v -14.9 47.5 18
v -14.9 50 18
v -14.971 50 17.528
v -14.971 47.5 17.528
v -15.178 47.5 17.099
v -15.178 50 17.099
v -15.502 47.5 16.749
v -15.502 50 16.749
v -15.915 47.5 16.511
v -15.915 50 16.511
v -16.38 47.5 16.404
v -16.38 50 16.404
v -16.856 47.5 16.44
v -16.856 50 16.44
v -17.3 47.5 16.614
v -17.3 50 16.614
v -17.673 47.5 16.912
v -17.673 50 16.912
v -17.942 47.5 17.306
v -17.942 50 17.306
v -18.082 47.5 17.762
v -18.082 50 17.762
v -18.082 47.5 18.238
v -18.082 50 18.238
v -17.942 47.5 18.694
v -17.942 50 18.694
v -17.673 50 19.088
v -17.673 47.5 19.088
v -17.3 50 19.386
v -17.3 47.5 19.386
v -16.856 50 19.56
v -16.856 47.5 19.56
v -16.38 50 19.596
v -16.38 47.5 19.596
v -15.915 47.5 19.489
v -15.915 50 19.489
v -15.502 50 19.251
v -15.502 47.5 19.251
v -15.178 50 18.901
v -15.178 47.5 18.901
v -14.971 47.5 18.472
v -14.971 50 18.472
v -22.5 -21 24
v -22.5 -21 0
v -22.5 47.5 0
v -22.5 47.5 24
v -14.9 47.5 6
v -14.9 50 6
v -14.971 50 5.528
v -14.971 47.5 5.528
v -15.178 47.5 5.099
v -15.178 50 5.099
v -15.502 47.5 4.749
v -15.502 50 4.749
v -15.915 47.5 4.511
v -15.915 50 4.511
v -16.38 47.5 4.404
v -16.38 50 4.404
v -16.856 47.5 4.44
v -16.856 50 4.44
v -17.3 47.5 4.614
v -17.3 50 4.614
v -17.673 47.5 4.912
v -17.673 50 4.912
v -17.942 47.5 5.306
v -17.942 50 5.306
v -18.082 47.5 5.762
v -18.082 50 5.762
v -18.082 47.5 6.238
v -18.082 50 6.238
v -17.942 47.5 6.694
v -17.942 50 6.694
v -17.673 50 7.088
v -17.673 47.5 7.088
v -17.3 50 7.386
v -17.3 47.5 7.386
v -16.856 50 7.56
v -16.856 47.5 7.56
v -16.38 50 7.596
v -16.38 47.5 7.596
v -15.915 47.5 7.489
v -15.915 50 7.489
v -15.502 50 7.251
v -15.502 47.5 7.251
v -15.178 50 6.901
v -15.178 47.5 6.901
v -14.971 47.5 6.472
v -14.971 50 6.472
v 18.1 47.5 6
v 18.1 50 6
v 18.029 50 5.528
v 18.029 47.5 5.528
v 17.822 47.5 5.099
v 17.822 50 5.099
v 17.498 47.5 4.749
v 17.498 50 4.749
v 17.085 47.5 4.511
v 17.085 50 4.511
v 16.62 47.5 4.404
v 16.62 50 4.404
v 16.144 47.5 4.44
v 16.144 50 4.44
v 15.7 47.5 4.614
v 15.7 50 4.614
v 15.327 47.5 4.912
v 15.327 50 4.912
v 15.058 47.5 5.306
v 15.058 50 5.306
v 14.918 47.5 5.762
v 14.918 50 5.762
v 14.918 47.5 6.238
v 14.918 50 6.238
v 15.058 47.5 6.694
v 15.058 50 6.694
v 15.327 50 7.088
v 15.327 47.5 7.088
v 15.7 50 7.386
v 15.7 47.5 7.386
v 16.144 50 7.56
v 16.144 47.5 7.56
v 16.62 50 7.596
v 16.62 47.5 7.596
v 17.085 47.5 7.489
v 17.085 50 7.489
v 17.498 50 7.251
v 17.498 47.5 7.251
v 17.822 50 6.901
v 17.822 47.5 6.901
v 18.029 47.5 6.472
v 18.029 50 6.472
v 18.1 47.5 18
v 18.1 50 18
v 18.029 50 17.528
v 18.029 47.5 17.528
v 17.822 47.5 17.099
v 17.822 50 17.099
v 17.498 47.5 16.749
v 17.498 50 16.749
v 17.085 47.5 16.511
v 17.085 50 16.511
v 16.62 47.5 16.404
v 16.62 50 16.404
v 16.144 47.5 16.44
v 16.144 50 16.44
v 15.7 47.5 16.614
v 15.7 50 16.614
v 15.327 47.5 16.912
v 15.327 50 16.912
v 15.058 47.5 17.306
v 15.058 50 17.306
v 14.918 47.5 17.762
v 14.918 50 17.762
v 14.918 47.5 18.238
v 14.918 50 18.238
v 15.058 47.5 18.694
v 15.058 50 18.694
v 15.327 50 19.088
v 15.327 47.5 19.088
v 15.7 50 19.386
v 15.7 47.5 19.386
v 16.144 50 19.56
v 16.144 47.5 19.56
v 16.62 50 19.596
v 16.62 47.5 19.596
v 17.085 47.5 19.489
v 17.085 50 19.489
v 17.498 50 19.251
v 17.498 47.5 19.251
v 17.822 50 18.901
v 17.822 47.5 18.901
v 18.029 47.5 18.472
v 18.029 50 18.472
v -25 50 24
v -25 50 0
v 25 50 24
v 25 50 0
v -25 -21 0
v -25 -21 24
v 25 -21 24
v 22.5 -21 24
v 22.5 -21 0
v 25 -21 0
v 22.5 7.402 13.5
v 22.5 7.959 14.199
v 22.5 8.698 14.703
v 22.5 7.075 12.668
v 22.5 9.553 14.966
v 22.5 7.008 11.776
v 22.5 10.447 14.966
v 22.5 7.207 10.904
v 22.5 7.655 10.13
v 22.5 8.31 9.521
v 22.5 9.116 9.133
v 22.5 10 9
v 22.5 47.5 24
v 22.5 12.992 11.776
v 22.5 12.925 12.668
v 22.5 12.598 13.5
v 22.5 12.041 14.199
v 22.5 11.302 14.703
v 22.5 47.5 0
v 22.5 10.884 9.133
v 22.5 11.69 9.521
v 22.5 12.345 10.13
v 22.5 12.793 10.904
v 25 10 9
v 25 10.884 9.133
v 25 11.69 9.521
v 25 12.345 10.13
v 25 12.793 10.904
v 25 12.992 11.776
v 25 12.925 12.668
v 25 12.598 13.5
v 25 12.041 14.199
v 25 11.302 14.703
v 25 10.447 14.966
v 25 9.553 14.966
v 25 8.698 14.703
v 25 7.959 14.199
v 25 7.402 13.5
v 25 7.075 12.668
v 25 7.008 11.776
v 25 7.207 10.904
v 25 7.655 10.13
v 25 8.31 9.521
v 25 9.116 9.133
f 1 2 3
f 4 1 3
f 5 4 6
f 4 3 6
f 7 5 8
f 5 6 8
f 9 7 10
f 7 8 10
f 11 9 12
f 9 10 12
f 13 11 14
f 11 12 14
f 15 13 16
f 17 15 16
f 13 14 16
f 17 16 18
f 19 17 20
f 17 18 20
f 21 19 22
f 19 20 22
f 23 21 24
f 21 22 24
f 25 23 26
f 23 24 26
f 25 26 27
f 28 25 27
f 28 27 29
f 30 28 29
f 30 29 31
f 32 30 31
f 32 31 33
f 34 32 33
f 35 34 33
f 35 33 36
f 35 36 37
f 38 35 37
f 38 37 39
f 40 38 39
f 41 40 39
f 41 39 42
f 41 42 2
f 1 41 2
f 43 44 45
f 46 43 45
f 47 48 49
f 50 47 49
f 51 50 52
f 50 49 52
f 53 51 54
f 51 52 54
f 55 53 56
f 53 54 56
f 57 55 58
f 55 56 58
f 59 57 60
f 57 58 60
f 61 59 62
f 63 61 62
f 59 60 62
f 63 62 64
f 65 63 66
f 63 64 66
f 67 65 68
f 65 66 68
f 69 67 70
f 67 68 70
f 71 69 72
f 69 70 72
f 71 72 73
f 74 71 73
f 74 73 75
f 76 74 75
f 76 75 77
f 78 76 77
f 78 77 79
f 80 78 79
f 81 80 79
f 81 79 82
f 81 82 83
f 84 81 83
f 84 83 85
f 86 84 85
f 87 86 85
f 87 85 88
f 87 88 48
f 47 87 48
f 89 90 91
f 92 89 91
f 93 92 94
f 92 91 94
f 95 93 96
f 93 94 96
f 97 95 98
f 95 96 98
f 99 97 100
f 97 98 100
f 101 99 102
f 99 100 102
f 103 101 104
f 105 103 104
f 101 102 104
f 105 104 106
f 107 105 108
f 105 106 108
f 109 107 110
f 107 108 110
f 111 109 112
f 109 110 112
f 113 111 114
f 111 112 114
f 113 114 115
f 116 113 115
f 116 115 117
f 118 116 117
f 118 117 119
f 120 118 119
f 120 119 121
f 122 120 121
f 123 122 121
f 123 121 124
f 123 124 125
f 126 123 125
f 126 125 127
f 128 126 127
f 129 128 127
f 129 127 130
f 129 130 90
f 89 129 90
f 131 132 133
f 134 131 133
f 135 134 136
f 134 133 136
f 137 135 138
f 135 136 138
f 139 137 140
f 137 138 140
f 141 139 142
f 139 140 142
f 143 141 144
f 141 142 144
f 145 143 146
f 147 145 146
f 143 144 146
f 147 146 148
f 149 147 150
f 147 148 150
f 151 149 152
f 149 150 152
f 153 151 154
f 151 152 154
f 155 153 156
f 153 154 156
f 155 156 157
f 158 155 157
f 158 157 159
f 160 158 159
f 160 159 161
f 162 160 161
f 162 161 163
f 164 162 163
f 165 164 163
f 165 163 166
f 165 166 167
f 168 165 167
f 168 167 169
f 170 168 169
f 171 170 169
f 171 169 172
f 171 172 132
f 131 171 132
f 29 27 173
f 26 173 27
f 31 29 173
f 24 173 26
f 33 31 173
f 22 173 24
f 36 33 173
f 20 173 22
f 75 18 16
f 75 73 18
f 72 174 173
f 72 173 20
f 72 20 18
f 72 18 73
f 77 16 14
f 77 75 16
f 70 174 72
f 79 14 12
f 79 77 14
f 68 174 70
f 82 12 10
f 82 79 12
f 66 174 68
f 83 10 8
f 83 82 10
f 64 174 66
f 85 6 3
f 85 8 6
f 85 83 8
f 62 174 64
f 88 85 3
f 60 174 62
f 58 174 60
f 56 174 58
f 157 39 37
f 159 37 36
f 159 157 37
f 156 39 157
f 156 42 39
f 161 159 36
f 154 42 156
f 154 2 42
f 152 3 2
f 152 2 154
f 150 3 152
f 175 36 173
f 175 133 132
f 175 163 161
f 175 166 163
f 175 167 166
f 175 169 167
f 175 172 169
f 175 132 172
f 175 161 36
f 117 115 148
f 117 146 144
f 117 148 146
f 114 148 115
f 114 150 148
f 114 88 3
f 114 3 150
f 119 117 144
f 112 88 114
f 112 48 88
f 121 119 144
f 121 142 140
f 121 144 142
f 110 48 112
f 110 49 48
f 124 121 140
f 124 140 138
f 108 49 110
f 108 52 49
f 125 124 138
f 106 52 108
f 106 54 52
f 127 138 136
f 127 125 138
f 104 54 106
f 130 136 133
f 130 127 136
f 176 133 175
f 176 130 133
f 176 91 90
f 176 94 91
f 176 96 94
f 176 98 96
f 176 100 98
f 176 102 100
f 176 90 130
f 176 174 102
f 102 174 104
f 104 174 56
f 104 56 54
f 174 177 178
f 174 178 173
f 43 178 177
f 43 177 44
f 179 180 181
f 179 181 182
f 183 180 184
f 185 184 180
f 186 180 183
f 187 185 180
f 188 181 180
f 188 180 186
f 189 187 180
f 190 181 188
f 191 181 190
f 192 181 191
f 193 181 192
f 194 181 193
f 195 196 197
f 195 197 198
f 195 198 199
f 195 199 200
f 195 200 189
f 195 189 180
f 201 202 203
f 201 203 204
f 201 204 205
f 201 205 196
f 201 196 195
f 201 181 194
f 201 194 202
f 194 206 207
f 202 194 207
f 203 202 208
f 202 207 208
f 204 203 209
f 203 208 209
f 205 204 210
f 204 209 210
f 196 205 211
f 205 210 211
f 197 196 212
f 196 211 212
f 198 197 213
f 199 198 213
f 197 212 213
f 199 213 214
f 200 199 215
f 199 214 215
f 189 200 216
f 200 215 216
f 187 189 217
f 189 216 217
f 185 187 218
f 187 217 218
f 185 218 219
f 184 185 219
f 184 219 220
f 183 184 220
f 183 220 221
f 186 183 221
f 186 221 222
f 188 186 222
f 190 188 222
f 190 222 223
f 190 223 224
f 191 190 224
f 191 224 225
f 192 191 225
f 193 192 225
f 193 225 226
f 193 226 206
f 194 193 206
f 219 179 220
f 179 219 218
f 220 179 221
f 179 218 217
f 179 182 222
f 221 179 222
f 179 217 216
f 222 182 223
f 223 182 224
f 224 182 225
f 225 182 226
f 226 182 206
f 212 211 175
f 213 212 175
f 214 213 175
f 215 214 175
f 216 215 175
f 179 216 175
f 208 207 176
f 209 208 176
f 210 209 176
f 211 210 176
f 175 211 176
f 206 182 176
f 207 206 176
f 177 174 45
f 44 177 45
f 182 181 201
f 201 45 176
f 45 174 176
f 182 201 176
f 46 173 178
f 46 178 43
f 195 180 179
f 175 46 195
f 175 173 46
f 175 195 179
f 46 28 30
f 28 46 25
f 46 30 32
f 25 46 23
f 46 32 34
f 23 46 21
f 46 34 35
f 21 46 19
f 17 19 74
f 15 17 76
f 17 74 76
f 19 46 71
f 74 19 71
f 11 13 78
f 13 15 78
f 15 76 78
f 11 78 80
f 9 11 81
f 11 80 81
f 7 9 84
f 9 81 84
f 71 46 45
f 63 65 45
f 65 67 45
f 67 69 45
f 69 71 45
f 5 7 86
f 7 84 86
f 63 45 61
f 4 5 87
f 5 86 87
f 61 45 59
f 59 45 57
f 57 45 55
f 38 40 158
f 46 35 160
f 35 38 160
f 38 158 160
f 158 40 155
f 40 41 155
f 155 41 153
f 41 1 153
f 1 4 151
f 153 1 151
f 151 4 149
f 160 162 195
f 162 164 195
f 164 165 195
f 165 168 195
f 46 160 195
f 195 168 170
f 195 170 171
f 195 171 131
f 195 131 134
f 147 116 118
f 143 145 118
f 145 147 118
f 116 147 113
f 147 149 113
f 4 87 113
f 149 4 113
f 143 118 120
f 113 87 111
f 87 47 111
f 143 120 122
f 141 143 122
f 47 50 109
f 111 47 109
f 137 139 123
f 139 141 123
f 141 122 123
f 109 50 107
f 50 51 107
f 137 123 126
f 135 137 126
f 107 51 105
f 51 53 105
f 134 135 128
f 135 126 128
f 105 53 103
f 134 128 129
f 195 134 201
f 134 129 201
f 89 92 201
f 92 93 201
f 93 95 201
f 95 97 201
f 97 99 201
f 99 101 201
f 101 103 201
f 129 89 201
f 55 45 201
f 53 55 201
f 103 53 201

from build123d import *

# Parameters (mm, degrees)
SKETCH_1_W                      = 50
SKETCH_1_H                      = 100
SKETCH_1_W_2                    = 45
SKETCH_1_H_2                    = 95
EXTRUDE_1_DEPTH                 = 24
SKETCH_3_R                      = 1.6
CUT_EXTRUDE_2_DEPTH             = 1
CUT_EXTRUDE_2_DEPTH_BACK        = 101
CUT_EXTRUDE_3_REACH             = 52
SKETCH_4_R                      = 3
SKETCH_4_R_2                    = 4
CUT_EXTRUDE_3_DIRECTION_2_DEPTH = 1
SKETCH_5_W                      = 50
SKETCH_5_H                      = 24
CUT_EXTRUDE_4_DEPTH             = 29


with BuildPart() as part:
    # ｽｹｯﾁ1 → ﾎﾞｽ - 押し出し1 (new body)
    with BuildSketch(Plane.XY):
        Rectangle(SKETCH_1_W, SKETCH_1_H)
        Rectangle(SKETCH_1_W_2, SKETCH_1_H_2, mode=Mode.SUBTRACT)
    extrude(amount=EXTRUDE_1_DEPTH)

    # ｽｹｯﾁ3 → ｶｯﾄ - 押し出し2 (cut, two sides)
    with BuildSketch(Plane(origin=(0, 50, 0), x_dir=(1, 0, 0), z_dir=(0, 1, 0))) as cut_extrude_2_sk:
        with Locations((-16.5, -6)):
            Circle(SKETCH_3_R)
        with Locations((16.5, -6)):
            Circle(SKETCH_3_R)
        with Locations((16.5, -18)):
            Circle(SKETCH_3_R)
        with Locations((-16.5, -18)):
            Circle(SKETCH_3_R)
    extrude(amount=CUT_EXTRUDE_2_DEPTH, mode=Mode.SUBTRACT)
    extrude(cut_extrude_2_sk.sketch, amount=-CUT_EXTRUDE_2_DEPTH_BACK, mode=Mode.SUBTRACT)

    # ｽｹｯﾁ4 → ｶｯﾄ - 押し出し3 (cut, up to next)
    with BuildSketch(Plane(origin=(25, 0, 0), x_dir=(0, 0, -1), z_dir=(1, 0, 0)), mode=Mode.PRIVATE) as cut_extrude_3_sk1:
        with Locations((-12, 10)):
            Circle(SKETCH_4_R)
    cut_extrude_3_tool1 = extrude(cut_extrude_3_sk1.sketch, amount=-CUT_EXTRUDE_3_REACH, mode=Mode.PRIVATE) & part.part
    add(cut_extrude_3_tool1.solids().sort_by_distance((25, 10, 12))[0], mode=Mode.SUBTRACT)
    # ｽｹｯﾁ4 → ｶｯﾄ - 押し出し3 (cut, up to next)
    with BuildSketch(Plane(origin=(25, 0, 0), x_dir=(0, 0, -1), z_dir=(1, 0, 0)), mode=Mode.PRIVATE) as cut_extrude_3_sk2:
        with Locations((-12, -30)):
            Circle(SKETCH_4_R_2)
    cut_extrude_3_tool2 = extrude(cut_extrude_3_sk2.sketch, amount=-CUT_EXTRUDE_3_REACH, mode=Mode.PRIVATE) & part.part
    add(cut_extrude_3_tool2.solids().sort_by_distance((25, -30, 12))[0], mode=Mode.SUBTRACT)

    # ｽｹｯﾁ4 → ｶｯﾄ - 押し出し3 direction 2 (cut)
    with BuildSketch(Plane(origin=(25, 0, 0), x_dir=(0, 0, -1), z_dir=(1, 0, 0))):
        with Locations((-12, 10)):
            Circle(SKETCH_4_R)
        with Locations((-12, -30)):
            Circle(SKETCH_4_R_2)
    extrude(amount=CUT_EXTRUDE_3_DIRECTION_2_DEPTH, mode=Mode.SUBTRACT)

    # ｽｹｯﾁ5 → ｶｯﾄ - 押し出し4 (cut)
    with BuildSketch(Plane.XZ.offset(50)):
        with Locations((0, 12)):
            Rectangle(SKETCH_5_W, SKETCH_5_H)
    extrude(amount=-CUT_EXTRUDE_4_DEPTH, mode=Mode.SUBTRACT)


solid = part.part
